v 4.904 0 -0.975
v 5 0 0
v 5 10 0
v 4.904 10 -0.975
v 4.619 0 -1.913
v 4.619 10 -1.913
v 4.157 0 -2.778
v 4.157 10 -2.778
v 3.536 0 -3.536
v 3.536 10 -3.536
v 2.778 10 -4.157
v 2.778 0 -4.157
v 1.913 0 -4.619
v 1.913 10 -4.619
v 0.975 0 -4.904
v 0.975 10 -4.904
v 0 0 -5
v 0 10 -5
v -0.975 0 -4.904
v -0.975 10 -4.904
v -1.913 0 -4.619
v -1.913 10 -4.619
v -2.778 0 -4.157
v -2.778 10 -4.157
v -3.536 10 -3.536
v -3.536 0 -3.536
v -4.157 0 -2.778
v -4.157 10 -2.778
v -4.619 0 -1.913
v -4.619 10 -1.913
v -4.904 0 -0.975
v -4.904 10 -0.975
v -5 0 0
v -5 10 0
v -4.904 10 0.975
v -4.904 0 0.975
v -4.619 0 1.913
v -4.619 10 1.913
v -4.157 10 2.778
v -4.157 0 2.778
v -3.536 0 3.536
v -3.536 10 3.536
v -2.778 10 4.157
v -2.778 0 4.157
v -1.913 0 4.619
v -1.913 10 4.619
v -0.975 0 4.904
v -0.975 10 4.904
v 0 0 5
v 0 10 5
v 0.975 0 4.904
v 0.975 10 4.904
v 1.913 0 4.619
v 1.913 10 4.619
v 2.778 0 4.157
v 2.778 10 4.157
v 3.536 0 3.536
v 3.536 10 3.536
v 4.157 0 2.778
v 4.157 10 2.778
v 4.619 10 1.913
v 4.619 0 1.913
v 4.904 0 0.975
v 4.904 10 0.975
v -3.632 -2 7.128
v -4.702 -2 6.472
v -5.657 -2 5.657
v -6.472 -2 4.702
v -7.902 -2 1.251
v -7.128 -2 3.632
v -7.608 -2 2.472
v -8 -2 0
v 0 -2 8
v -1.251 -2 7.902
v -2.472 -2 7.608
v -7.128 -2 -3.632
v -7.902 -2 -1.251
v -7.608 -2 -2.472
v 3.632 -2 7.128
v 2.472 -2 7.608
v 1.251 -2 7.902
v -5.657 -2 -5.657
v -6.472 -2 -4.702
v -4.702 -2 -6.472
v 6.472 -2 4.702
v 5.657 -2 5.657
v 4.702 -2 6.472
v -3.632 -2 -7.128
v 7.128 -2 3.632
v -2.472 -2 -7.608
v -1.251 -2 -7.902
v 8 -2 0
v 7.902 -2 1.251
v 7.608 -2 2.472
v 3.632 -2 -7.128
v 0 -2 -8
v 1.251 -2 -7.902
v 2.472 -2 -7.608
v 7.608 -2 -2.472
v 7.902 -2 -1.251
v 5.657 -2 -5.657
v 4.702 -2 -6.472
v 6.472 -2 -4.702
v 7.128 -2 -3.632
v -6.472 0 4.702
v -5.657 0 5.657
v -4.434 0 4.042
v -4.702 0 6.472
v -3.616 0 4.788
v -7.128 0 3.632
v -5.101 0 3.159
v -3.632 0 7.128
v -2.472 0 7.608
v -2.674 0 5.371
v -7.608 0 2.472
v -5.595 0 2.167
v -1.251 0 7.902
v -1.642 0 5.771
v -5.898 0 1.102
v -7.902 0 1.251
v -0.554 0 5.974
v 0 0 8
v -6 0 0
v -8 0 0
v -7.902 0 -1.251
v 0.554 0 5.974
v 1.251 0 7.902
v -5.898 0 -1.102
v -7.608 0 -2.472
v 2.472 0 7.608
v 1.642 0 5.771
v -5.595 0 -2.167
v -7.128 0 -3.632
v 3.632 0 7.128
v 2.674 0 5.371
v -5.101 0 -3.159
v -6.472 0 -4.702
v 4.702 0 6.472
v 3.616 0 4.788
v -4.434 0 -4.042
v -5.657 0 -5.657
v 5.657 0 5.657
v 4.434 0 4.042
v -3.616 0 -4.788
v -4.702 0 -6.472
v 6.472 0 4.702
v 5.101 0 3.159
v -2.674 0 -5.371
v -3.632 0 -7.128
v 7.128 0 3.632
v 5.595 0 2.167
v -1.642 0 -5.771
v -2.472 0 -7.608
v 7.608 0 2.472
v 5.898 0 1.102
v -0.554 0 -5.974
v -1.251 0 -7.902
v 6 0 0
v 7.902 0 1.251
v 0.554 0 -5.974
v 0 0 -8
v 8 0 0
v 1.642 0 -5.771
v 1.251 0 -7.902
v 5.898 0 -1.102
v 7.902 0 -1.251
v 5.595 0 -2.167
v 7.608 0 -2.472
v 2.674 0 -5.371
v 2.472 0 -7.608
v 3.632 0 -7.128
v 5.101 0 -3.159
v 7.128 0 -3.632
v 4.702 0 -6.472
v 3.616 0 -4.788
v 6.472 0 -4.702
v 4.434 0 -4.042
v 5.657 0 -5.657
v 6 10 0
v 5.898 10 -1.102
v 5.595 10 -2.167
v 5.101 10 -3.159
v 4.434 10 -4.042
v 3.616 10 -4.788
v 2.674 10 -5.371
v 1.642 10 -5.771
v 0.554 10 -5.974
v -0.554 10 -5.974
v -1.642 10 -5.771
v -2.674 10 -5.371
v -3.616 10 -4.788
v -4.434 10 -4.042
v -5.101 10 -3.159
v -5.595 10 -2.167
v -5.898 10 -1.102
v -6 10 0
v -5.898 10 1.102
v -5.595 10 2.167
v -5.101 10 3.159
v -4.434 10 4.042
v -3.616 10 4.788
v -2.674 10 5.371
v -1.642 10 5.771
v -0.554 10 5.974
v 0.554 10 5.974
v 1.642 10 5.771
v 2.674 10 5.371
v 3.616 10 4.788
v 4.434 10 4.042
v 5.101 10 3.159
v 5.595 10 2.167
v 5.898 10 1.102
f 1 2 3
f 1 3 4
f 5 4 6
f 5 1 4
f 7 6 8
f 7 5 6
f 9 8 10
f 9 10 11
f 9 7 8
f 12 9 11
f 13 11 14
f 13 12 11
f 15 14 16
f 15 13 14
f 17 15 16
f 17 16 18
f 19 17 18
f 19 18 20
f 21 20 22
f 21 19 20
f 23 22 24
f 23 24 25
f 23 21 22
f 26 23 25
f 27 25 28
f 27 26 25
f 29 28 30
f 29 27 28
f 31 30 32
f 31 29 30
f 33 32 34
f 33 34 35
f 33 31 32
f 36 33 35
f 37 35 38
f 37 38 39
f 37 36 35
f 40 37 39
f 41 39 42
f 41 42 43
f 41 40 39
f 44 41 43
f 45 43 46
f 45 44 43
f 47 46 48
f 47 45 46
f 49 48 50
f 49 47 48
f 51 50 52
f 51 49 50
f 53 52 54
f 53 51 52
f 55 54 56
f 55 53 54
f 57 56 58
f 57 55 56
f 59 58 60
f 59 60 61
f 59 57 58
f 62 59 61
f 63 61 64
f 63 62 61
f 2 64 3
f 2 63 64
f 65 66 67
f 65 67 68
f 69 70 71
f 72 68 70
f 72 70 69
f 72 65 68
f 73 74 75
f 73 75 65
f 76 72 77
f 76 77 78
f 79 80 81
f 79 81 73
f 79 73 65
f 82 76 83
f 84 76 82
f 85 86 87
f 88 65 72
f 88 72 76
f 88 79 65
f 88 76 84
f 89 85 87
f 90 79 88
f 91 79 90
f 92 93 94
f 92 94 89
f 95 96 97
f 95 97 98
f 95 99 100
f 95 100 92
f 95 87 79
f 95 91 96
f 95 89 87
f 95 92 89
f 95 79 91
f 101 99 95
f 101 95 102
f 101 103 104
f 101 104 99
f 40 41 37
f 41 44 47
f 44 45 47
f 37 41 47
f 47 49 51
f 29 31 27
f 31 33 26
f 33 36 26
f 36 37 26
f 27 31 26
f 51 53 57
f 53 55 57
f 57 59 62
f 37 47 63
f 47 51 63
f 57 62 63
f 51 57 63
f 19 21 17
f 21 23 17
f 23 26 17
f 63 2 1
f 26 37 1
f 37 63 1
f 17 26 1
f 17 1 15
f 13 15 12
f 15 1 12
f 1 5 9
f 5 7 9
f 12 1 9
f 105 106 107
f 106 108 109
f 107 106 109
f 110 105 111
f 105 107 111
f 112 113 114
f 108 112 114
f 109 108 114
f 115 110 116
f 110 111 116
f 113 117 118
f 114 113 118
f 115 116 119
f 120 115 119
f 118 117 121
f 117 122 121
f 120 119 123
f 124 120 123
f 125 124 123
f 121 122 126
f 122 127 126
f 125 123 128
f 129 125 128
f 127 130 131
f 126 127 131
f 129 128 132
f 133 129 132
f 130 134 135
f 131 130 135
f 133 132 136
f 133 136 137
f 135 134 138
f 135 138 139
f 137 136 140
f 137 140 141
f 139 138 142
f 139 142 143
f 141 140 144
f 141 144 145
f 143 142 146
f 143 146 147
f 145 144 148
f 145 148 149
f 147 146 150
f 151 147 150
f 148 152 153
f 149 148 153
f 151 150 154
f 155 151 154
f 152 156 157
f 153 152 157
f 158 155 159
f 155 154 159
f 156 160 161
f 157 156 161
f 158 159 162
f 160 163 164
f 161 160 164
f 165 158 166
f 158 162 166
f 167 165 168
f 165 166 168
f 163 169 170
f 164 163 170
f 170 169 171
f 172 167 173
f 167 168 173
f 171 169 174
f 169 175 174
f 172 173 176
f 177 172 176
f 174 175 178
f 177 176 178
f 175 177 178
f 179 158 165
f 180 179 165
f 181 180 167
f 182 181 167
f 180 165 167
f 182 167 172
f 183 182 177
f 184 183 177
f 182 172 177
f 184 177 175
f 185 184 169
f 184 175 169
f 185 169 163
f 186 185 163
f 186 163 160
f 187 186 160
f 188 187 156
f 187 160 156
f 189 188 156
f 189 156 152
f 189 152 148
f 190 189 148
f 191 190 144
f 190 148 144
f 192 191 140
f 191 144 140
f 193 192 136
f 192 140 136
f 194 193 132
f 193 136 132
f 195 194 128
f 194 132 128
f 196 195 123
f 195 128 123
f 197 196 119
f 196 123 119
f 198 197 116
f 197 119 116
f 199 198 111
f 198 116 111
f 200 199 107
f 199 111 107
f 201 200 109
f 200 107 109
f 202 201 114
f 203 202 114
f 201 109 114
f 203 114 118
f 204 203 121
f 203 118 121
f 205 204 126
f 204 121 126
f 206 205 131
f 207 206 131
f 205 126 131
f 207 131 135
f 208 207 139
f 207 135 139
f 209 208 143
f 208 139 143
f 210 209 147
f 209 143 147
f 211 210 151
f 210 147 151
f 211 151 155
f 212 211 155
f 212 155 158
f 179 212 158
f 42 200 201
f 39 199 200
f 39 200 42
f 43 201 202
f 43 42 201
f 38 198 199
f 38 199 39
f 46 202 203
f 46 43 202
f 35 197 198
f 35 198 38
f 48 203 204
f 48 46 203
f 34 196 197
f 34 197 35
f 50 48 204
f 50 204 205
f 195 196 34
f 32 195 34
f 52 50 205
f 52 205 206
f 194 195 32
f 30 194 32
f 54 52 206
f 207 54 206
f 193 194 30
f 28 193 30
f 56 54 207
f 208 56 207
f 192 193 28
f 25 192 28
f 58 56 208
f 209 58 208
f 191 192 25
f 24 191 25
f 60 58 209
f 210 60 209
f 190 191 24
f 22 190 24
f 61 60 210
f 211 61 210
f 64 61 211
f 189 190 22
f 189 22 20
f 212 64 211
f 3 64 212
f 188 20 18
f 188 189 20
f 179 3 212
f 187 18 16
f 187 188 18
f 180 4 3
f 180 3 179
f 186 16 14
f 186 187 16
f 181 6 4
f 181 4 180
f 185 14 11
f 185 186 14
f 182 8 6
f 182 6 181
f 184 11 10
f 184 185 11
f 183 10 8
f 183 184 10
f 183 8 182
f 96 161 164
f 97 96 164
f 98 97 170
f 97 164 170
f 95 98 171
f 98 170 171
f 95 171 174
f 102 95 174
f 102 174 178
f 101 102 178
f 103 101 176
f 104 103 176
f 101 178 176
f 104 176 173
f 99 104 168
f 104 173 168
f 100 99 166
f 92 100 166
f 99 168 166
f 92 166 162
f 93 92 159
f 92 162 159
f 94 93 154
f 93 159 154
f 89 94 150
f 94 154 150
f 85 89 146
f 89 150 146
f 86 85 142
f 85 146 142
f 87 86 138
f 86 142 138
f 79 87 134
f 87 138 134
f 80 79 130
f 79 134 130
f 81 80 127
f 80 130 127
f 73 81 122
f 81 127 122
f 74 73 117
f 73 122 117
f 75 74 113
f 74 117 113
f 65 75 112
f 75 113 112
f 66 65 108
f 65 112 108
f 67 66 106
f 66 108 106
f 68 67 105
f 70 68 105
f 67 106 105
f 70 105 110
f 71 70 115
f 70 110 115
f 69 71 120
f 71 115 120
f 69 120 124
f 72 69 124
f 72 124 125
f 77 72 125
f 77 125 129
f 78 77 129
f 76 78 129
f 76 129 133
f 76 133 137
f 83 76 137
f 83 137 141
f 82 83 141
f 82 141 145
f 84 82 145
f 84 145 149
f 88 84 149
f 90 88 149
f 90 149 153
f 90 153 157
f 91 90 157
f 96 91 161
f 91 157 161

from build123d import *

# Parameters (mm, degrees)
ESQUISSE1_R    = 6
ESQUISSE1_R_2  = 5
CYLINDRE_DEPTH = 10
ESQUISSE2_R    = 8
BASE_DEPTH     = 2


with BuildPart() as part:
    # Esquisse1 → Cylindre (new body)
    with BuildSketch(Plane(origin=(0, 0, 0), x_dir=(1, 0, 0), z_dir=(0, 1, 0))):
        Circle(ESQUISSE1_R)
        Circle(ESQUISSE1_R_2, mode=Mode.SUBTRACT)
    extrude(amount=CYLINDRE_DEPTH)

    # Esquisse2 → Base (add)
    with BuildSketch(Plane.XZ):
        with Locations(Location((0, 0, 0), (0, 0, 270))):
            Circle(ESQUISSE2_R)
    extrude(amount=BASE_DEPTH)


solid = part.part
